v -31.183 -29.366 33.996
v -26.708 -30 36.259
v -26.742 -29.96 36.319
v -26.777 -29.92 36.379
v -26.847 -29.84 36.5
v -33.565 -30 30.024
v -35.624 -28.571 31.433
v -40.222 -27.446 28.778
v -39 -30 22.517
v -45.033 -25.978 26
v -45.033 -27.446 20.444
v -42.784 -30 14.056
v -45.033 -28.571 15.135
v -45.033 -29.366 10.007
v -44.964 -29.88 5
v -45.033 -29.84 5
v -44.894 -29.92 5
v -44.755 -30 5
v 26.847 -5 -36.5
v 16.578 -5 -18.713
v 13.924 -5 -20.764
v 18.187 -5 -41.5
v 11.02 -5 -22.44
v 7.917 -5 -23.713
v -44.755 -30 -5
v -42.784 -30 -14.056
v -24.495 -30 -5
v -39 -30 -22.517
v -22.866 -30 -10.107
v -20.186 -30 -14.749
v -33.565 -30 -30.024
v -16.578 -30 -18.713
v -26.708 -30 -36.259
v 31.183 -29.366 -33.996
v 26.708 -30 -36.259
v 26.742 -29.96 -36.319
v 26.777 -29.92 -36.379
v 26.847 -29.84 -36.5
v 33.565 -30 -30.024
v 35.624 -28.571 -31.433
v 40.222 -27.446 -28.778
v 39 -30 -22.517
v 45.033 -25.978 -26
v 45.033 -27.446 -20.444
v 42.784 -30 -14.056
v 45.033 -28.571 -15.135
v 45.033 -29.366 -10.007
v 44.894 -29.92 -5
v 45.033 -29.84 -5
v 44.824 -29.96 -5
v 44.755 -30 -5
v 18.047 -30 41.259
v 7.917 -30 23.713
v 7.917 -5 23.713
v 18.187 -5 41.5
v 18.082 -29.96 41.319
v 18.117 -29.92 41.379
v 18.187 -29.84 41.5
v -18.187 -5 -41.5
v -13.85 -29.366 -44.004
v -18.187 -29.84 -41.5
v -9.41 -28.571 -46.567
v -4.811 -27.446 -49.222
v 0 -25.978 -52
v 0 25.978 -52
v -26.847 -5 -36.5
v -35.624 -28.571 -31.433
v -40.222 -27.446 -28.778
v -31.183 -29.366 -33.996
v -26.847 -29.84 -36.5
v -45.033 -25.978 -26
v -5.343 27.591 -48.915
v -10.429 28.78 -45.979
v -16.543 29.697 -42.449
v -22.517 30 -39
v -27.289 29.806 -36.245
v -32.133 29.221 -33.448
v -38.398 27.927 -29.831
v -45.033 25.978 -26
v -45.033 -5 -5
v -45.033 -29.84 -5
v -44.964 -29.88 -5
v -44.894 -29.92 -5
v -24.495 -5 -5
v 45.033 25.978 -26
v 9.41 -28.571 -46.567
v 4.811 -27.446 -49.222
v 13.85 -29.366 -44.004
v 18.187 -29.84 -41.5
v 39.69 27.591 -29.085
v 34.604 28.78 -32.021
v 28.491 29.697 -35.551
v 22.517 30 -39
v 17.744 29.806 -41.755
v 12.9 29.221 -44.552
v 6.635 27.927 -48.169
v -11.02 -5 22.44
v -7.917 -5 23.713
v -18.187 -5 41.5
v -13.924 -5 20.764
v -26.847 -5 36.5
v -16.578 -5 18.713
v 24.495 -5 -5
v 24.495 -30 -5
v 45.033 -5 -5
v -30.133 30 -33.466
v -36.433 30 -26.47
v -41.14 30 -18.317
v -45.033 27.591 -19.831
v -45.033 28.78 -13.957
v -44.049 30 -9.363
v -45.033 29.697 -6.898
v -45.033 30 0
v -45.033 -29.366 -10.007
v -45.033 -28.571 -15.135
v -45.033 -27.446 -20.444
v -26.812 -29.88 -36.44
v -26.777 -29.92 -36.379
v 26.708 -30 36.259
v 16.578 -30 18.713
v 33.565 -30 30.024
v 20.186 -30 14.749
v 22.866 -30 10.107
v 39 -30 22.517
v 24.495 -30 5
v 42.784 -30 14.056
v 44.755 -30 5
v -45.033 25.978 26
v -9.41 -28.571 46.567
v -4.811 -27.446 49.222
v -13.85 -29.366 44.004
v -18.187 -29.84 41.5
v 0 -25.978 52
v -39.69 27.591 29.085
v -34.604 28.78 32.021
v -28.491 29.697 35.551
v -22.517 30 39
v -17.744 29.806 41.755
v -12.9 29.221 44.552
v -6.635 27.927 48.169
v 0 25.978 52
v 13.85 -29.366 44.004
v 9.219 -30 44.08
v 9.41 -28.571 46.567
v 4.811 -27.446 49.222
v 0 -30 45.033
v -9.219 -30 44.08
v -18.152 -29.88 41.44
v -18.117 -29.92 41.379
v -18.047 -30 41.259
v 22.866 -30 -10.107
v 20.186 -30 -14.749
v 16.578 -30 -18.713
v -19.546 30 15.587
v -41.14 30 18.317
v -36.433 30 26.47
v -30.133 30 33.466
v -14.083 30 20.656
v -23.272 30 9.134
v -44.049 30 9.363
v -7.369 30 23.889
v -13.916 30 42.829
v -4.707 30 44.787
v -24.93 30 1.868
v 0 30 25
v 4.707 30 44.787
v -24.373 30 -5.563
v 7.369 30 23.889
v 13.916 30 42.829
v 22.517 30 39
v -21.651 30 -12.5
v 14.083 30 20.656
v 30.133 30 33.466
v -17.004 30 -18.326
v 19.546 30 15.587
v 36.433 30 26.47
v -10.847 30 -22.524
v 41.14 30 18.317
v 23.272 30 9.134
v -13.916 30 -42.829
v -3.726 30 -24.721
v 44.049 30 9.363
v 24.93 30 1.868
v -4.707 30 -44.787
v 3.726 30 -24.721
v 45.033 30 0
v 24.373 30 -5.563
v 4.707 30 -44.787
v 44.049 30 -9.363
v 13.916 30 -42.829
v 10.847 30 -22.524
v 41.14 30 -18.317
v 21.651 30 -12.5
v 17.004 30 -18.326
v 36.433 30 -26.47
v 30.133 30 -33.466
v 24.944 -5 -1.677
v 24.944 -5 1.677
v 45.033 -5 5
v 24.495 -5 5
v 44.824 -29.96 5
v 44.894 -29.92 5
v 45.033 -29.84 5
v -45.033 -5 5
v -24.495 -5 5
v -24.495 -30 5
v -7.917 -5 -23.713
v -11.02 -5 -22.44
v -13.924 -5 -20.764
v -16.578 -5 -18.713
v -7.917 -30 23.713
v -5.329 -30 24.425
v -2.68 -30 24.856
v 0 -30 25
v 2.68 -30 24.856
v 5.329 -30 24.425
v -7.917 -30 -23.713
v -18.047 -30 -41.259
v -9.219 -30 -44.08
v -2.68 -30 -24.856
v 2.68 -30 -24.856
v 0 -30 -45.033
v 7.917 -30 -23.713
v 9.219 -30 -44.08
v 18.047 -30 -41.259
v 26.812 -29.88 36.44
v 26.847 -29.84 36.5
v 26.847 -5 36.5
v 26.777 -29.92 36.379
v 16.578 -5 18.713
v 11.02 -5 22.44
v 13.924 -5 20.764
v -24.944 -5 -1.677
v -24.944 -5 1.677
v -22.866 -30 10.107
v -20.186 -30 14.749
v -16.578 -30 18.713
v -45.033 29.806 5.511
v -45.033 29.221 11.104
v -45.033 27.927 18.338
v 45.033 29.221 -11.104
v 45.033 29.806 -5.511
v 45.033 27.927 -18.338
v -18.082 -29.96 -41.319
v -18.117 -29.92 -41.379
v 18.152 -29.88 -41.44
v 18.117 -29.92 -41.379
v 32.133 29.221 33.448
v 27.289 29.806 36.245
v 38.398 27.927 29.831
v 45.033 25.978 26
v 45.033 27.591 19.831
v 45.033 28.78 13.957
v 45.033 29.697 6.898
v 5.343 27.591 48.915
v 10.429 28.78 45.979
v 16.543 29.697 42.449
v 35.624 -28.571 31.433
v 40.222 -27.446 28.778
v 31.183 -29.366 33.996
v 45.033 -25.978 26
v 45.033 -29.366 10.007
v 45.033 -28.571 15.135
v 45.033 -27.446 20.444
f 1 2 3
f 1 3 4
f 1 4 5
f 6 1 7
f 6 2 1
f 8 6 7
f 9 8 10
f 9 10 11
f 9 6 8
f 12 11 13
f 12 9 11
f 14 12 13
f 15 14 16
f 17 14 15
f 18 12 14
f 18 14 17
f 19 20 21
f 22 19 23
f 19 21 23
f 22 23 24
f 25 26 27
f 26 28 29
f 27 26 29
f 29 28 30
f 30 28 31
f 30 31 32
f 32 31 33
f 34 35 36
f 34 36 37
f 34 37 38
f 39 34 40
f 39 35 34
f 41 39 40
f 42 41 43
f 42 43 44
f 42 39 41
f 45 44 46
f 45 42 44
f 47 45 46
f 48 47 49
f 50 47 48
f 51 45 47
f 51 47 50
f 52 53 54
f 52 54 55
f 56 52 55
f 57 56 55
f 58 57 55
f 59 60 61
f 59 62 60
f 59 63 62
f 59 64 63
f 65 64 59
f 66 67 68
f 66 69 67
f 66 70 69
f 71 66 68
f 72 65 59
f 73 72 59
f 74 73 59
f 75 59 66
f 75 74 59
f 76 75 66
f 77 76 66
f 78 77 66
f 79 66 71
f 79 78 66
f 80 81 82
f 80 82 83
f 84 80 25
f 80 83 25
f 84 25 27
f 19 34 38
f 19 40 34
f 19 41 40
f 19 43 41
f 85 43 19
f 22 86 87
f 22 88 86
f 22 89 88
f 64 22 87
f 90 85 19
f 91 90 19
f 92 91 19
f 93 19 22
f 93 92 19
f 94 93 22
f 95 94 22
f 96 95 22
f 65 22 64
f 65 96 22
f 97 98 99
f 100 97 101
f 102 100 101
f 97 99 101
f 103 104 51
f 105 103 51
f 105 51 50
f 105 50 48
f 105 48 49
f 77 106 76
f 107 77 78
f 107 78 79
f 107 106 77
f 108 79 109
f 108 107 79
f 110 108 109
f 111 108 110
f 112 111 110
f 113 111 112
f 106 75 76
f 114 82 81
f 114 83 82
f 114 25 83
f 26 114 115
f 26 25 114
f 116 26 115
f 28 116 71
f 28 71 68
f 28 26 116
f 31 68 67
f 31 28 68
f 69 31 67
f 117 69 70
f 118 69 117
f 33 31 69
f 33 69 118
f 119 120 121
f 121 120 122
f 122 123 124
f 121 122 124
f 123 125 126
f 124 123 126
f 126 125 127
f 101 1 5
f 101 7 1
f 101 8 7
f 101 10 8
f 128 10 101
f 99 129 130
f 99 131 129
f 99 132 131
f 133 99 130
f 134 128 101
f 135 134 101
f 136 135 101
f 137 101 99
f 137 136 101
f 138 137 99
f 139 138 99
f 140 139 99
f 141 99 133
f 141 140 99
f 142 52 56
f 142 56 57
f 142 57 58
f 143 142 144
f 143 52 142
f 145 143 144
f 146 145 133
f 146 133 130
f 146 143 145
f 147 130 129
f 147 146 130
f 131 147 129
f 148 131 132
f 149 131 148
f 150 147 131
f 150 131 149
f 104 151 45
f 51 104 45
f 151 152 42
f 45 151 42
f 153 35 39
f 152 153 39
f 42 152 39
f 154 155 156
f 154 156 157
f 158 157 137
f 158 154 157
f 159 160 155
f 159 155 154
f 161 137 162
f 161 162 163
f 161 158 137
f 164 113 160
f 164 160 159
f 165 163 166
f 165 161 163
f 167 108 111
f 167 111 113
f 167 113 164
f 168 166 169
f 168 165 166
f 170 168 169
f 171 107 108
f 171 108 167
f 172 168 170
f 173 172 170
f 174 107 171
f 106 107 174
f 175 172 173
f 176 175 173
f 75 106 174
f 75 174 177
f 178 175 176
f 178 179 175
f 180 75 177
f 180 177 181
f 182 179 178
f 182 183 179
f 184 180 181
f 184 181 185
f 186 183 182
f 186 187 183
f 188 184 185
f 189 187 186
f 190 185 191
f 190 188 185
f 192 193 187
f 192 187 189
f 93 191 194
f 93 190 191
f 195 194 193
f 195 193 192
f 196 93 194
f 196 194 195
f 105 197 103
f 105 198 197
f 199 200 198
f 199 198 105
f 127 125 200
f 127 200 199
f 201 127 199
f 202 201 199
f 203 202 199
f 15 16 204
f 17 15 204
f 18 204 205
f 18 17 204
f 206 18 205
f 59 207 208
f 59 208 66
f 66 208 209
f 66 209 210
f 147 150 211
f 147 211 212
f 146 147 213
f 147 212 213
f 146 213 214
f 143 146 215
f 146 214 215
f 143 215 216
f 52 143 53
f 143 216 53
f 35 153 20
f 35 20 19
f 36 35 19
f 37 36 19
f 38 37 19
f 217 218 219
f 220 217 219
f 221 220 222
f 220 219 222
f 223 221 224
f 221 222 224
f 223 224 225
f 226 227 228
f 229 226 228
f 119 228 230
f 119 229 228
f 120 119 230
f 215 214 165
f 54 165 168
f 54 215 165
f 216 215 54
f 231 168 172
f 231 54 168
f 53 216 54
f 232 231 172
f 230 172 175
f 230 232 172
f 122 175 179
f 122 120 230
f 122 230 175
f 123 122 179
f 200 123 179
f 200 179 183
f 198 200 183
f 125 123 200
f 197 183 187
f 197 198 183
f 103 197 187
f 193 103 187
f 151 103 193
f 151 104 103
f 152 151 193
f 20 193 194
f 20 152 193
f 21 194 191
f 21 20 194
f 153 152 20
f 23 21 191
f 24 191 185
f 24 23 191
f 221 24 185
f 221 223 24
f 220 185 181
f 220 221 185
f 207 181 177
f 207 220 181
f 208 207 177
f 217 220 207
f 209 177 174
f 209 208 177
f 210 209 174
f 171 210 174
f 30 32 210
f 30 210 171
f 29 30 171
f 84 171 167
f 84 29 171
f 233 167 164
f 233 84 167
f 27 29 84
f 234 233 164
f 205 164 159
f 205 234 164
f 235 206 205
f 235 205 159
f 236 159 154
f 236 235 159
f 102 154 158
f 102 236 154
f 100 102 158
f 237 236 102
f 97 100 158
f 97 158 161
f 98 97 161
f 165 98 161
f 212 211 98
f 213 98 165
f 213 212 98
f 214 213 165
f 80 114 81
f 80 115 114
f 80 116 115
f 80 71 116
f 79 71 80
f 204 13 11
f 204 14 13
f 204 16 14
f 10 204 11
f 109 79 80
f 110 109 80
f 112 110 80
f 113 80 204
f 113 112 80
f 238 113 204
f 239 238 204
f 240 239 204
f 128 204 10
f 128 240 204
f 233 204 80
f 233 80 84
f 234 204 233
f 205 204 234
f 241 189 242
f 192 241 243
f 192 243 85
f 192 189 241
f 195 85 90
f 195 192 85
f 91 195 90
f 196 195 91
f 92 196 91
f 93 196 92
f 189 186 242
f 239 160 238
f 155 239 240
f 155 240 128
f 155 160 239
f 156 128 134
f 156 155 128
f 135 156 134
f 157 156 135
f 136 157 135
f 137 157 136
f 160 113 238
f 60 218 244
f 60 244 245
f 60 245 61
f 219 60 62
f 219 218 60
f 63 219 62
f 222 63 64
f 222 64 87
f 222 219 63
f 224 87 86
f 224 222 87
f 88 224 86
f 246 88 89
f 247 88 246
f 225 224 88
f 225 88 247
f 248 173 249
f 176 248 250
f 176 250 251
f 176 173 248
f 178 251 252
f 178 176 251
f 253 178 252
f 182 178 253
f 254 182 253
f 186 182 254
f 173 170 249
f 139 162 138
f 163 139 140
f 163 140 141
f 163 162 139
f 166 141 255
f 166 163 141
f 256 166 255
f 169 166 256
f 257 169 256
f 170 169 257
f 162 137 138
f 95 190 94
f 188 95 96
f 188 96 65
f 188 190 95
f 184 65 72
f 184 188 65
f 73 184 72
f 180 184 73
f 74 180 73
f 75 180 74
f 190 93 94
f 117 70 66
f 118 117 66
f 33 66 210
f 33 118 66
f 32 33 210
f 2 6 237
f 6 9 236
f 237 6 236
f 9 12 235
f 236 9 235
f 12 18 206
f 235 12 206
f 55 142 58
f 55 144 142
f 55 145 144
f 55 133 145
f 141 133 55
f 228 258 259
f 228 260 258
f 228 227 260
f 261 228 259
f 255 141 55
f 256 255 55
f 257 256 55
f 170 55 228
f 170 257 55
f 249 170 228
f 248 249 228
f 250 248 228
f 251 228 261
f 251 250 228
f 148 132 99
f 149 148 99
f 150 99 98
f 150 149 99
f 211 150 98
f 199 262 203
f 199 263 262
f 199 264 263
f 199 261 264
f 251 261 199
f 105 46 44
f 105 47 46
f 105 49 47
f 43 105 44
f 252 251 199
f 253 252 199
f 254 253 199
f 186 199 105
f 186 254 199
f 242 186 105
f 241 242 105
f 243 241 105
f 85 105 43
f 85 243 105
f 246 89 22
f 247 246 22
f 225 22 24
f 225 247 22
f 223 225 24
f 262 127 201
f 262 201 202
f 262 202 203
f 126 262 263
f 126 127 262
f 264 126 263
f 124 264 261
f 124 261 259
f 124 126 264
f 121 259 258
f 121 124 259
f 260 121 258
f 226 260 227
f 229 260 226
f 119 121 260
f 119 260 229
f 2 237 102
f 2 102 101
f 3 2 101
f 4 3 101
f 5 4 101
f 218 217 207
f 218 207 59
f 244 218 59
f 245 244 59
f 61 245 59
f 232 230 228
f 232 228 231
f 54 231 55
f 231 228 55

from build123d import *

# Parameters (mm, degrees)
SKETCH2_R           = 25
BOSS_EXTRUDE1_DEPTH = 30
SKETCH3_OUTSIDE_W   = 329.93
SKETCH3_OUTSIDE_H   = 343.864
SKETCH3_OUTSIDE_R   = 45.033320997
CUT_EXTRUDE1_DEPTH  = 60
CUT_EXTRUDE1_DRAFT  = -60
SKETCH4_OUTSIDE_W   = 329.93
SKETCH4_OUTSIDE_H   = 343.864
SKETCH4_OUTSIDE_R   = 45.033320997
CUT_EXTRUDE2_DEPTH  = 60
CUT_EXTRUDE2_DRAFT  = -60
SKETCH5_W           = 27.935883882
SKETCH5_H           = 10
CUT_EXTRUDE4_DEPTH  = 25


with BuildPart() as part:
    # Sketch2 → Boss-Extrude1 (new, symmetric)
    with BuildSketch(Plane(origin=(0, 0, 0), x_dir=(1, 0, 0), z_dir=(0, 1, 0))):
        Polygon((0, 52), (-45.033320997, 26), (-45.033320997, -26), (0, -52), (45.033320997, -26), (45.033320997, 26), align=None)
        with Locations(Location((0, 0, 0), (0, 0, 270))):
            Circle(SKETCH2_R, mode=Mode.SUBTRACT)
    extrude(amount=BOSS_EXTRUDE1_DEPTH, both=True)


with BuildPart() as cut_extrude1_tool:
    # Sketch3 outside → Cut-Extrude1 (with draft: the straight prism first)
    with BuildSketch(Plane(origin=(0, 30, 0), x_dir=(1, 0, 0), z_dir=(0, 1, 0))):
        Rectangle(SKETCH3_OUTSIDE_W, SKETCH3_OUTSIDE_H)
        Circle(SKETCH3_OUTSIDE_R, mode=Mode.SUBTRACT)
    extrude(amount=-CUT_EXTRUDE1_DEPTH)
    # Cut-Extrude1: the draft: its side faces are tilted about the plane it starts from
    cut_extrude1_sides = [cut_extrude1_tool.faces().sort_by_distance(p)[0] for p in [
        (0, 0, 171.932),
        (164.965, 0, 0),
        (0, 0, -171.932),
        (-164.965, 0, 0),
        (-45.033320997, 0, 0),
    ]]
    draft(cut_extrude1_sides, Plane(origin=(0, 30, 0), x_dir=(1, 0, 0), z_dir=(0, 1, 0)), CUT_EXTRUDE1_DRAFT)


with BuildPart() as part_1:
    add(part.part)

    # Cut-Extrude1: cut by cut_extrude1_tool
    add(cut_extrude1_tool.part, mode=Mode.SUBTRACT)


with BuildPart() as cut_extrude2_tool:
    # Sketch4 outside → Cut-Extrude2 (with draft: the straight prism first)
    with BuildSketch(Plane.XZ.offset(30)):
        Rectangle(SKETCH4_OUTSIDE_W, SKETCH4_OUTSIDE_H)
        Circle(SKETCH4_OUTSIDE_R, mode=Mode.SUBTRACT)
    extrude(amount=-CUT_EXTRUDE2_DEPTH)
    # Cut-Extrude2: the draft: its side faces are tilted about the plane it starts from
    cut_extrude2_sides = [cut_extrude2_tool.faces().sort_by_distance(p)[0] for p in [
        (0, 0, -171.932),
        (164.965, 0, 0),
        (0, 0, 171.932),
        (-164.965, 0, 0),
        (-45.033320997, 0, 0),
    ]]
    draft(cut_extrude2_sides, Plane.XZ.offset(30), CUT_EXTRUDE2_DRAFT)


with BuildPart() as part_2:
    add(part_1.part)

    # Cut-Extrude2: cut by cut_extrude2_tool
    add(cut_extrude2_tool.part, mode=Mode.SUBTRACT)

    # Sketch5 → Cut-Extrude4 (cut)
    with BuildSketch(Plane.XZ.offset(30)):
        with Locations((33.722829942, 0)):
            Rectangle(SKETCH5_W, SKETCH5_H)
        Polygon((19.515258923, -43.801419977), (5.547316982, -19.608234858), (14.20757102, -14.608234858), (28.175512961, -38.801419977), align=None)
        Polygon((-28.175512961, -38.801419977), (-14.20757102, -14.608234858), (-5.547316982, -19.608234858), (-19.515258923, -43.801419977), align=None)
        with Locations((-33.722829942, 0)):
            Rectangle(SKETCH5_W, SKETCH5_H)
        Polygon((-19.515258923, 43.801419977), (-5.547316982, 19.608234858), (-14.20757102, 14.608234858), (-28.175512961, 38.801419977), align=None)
        Polygon((28.175512961, 38.801419977), (14.20757102, 14.608234858), (5.547316982, 19.608234858), (19.515258923, 43.801419977), align=None)
    extrude(amount=-CUT_EXTRUDE4_DEPTH, mode=Mode.SUBTRACT)


solid = part_2.part
